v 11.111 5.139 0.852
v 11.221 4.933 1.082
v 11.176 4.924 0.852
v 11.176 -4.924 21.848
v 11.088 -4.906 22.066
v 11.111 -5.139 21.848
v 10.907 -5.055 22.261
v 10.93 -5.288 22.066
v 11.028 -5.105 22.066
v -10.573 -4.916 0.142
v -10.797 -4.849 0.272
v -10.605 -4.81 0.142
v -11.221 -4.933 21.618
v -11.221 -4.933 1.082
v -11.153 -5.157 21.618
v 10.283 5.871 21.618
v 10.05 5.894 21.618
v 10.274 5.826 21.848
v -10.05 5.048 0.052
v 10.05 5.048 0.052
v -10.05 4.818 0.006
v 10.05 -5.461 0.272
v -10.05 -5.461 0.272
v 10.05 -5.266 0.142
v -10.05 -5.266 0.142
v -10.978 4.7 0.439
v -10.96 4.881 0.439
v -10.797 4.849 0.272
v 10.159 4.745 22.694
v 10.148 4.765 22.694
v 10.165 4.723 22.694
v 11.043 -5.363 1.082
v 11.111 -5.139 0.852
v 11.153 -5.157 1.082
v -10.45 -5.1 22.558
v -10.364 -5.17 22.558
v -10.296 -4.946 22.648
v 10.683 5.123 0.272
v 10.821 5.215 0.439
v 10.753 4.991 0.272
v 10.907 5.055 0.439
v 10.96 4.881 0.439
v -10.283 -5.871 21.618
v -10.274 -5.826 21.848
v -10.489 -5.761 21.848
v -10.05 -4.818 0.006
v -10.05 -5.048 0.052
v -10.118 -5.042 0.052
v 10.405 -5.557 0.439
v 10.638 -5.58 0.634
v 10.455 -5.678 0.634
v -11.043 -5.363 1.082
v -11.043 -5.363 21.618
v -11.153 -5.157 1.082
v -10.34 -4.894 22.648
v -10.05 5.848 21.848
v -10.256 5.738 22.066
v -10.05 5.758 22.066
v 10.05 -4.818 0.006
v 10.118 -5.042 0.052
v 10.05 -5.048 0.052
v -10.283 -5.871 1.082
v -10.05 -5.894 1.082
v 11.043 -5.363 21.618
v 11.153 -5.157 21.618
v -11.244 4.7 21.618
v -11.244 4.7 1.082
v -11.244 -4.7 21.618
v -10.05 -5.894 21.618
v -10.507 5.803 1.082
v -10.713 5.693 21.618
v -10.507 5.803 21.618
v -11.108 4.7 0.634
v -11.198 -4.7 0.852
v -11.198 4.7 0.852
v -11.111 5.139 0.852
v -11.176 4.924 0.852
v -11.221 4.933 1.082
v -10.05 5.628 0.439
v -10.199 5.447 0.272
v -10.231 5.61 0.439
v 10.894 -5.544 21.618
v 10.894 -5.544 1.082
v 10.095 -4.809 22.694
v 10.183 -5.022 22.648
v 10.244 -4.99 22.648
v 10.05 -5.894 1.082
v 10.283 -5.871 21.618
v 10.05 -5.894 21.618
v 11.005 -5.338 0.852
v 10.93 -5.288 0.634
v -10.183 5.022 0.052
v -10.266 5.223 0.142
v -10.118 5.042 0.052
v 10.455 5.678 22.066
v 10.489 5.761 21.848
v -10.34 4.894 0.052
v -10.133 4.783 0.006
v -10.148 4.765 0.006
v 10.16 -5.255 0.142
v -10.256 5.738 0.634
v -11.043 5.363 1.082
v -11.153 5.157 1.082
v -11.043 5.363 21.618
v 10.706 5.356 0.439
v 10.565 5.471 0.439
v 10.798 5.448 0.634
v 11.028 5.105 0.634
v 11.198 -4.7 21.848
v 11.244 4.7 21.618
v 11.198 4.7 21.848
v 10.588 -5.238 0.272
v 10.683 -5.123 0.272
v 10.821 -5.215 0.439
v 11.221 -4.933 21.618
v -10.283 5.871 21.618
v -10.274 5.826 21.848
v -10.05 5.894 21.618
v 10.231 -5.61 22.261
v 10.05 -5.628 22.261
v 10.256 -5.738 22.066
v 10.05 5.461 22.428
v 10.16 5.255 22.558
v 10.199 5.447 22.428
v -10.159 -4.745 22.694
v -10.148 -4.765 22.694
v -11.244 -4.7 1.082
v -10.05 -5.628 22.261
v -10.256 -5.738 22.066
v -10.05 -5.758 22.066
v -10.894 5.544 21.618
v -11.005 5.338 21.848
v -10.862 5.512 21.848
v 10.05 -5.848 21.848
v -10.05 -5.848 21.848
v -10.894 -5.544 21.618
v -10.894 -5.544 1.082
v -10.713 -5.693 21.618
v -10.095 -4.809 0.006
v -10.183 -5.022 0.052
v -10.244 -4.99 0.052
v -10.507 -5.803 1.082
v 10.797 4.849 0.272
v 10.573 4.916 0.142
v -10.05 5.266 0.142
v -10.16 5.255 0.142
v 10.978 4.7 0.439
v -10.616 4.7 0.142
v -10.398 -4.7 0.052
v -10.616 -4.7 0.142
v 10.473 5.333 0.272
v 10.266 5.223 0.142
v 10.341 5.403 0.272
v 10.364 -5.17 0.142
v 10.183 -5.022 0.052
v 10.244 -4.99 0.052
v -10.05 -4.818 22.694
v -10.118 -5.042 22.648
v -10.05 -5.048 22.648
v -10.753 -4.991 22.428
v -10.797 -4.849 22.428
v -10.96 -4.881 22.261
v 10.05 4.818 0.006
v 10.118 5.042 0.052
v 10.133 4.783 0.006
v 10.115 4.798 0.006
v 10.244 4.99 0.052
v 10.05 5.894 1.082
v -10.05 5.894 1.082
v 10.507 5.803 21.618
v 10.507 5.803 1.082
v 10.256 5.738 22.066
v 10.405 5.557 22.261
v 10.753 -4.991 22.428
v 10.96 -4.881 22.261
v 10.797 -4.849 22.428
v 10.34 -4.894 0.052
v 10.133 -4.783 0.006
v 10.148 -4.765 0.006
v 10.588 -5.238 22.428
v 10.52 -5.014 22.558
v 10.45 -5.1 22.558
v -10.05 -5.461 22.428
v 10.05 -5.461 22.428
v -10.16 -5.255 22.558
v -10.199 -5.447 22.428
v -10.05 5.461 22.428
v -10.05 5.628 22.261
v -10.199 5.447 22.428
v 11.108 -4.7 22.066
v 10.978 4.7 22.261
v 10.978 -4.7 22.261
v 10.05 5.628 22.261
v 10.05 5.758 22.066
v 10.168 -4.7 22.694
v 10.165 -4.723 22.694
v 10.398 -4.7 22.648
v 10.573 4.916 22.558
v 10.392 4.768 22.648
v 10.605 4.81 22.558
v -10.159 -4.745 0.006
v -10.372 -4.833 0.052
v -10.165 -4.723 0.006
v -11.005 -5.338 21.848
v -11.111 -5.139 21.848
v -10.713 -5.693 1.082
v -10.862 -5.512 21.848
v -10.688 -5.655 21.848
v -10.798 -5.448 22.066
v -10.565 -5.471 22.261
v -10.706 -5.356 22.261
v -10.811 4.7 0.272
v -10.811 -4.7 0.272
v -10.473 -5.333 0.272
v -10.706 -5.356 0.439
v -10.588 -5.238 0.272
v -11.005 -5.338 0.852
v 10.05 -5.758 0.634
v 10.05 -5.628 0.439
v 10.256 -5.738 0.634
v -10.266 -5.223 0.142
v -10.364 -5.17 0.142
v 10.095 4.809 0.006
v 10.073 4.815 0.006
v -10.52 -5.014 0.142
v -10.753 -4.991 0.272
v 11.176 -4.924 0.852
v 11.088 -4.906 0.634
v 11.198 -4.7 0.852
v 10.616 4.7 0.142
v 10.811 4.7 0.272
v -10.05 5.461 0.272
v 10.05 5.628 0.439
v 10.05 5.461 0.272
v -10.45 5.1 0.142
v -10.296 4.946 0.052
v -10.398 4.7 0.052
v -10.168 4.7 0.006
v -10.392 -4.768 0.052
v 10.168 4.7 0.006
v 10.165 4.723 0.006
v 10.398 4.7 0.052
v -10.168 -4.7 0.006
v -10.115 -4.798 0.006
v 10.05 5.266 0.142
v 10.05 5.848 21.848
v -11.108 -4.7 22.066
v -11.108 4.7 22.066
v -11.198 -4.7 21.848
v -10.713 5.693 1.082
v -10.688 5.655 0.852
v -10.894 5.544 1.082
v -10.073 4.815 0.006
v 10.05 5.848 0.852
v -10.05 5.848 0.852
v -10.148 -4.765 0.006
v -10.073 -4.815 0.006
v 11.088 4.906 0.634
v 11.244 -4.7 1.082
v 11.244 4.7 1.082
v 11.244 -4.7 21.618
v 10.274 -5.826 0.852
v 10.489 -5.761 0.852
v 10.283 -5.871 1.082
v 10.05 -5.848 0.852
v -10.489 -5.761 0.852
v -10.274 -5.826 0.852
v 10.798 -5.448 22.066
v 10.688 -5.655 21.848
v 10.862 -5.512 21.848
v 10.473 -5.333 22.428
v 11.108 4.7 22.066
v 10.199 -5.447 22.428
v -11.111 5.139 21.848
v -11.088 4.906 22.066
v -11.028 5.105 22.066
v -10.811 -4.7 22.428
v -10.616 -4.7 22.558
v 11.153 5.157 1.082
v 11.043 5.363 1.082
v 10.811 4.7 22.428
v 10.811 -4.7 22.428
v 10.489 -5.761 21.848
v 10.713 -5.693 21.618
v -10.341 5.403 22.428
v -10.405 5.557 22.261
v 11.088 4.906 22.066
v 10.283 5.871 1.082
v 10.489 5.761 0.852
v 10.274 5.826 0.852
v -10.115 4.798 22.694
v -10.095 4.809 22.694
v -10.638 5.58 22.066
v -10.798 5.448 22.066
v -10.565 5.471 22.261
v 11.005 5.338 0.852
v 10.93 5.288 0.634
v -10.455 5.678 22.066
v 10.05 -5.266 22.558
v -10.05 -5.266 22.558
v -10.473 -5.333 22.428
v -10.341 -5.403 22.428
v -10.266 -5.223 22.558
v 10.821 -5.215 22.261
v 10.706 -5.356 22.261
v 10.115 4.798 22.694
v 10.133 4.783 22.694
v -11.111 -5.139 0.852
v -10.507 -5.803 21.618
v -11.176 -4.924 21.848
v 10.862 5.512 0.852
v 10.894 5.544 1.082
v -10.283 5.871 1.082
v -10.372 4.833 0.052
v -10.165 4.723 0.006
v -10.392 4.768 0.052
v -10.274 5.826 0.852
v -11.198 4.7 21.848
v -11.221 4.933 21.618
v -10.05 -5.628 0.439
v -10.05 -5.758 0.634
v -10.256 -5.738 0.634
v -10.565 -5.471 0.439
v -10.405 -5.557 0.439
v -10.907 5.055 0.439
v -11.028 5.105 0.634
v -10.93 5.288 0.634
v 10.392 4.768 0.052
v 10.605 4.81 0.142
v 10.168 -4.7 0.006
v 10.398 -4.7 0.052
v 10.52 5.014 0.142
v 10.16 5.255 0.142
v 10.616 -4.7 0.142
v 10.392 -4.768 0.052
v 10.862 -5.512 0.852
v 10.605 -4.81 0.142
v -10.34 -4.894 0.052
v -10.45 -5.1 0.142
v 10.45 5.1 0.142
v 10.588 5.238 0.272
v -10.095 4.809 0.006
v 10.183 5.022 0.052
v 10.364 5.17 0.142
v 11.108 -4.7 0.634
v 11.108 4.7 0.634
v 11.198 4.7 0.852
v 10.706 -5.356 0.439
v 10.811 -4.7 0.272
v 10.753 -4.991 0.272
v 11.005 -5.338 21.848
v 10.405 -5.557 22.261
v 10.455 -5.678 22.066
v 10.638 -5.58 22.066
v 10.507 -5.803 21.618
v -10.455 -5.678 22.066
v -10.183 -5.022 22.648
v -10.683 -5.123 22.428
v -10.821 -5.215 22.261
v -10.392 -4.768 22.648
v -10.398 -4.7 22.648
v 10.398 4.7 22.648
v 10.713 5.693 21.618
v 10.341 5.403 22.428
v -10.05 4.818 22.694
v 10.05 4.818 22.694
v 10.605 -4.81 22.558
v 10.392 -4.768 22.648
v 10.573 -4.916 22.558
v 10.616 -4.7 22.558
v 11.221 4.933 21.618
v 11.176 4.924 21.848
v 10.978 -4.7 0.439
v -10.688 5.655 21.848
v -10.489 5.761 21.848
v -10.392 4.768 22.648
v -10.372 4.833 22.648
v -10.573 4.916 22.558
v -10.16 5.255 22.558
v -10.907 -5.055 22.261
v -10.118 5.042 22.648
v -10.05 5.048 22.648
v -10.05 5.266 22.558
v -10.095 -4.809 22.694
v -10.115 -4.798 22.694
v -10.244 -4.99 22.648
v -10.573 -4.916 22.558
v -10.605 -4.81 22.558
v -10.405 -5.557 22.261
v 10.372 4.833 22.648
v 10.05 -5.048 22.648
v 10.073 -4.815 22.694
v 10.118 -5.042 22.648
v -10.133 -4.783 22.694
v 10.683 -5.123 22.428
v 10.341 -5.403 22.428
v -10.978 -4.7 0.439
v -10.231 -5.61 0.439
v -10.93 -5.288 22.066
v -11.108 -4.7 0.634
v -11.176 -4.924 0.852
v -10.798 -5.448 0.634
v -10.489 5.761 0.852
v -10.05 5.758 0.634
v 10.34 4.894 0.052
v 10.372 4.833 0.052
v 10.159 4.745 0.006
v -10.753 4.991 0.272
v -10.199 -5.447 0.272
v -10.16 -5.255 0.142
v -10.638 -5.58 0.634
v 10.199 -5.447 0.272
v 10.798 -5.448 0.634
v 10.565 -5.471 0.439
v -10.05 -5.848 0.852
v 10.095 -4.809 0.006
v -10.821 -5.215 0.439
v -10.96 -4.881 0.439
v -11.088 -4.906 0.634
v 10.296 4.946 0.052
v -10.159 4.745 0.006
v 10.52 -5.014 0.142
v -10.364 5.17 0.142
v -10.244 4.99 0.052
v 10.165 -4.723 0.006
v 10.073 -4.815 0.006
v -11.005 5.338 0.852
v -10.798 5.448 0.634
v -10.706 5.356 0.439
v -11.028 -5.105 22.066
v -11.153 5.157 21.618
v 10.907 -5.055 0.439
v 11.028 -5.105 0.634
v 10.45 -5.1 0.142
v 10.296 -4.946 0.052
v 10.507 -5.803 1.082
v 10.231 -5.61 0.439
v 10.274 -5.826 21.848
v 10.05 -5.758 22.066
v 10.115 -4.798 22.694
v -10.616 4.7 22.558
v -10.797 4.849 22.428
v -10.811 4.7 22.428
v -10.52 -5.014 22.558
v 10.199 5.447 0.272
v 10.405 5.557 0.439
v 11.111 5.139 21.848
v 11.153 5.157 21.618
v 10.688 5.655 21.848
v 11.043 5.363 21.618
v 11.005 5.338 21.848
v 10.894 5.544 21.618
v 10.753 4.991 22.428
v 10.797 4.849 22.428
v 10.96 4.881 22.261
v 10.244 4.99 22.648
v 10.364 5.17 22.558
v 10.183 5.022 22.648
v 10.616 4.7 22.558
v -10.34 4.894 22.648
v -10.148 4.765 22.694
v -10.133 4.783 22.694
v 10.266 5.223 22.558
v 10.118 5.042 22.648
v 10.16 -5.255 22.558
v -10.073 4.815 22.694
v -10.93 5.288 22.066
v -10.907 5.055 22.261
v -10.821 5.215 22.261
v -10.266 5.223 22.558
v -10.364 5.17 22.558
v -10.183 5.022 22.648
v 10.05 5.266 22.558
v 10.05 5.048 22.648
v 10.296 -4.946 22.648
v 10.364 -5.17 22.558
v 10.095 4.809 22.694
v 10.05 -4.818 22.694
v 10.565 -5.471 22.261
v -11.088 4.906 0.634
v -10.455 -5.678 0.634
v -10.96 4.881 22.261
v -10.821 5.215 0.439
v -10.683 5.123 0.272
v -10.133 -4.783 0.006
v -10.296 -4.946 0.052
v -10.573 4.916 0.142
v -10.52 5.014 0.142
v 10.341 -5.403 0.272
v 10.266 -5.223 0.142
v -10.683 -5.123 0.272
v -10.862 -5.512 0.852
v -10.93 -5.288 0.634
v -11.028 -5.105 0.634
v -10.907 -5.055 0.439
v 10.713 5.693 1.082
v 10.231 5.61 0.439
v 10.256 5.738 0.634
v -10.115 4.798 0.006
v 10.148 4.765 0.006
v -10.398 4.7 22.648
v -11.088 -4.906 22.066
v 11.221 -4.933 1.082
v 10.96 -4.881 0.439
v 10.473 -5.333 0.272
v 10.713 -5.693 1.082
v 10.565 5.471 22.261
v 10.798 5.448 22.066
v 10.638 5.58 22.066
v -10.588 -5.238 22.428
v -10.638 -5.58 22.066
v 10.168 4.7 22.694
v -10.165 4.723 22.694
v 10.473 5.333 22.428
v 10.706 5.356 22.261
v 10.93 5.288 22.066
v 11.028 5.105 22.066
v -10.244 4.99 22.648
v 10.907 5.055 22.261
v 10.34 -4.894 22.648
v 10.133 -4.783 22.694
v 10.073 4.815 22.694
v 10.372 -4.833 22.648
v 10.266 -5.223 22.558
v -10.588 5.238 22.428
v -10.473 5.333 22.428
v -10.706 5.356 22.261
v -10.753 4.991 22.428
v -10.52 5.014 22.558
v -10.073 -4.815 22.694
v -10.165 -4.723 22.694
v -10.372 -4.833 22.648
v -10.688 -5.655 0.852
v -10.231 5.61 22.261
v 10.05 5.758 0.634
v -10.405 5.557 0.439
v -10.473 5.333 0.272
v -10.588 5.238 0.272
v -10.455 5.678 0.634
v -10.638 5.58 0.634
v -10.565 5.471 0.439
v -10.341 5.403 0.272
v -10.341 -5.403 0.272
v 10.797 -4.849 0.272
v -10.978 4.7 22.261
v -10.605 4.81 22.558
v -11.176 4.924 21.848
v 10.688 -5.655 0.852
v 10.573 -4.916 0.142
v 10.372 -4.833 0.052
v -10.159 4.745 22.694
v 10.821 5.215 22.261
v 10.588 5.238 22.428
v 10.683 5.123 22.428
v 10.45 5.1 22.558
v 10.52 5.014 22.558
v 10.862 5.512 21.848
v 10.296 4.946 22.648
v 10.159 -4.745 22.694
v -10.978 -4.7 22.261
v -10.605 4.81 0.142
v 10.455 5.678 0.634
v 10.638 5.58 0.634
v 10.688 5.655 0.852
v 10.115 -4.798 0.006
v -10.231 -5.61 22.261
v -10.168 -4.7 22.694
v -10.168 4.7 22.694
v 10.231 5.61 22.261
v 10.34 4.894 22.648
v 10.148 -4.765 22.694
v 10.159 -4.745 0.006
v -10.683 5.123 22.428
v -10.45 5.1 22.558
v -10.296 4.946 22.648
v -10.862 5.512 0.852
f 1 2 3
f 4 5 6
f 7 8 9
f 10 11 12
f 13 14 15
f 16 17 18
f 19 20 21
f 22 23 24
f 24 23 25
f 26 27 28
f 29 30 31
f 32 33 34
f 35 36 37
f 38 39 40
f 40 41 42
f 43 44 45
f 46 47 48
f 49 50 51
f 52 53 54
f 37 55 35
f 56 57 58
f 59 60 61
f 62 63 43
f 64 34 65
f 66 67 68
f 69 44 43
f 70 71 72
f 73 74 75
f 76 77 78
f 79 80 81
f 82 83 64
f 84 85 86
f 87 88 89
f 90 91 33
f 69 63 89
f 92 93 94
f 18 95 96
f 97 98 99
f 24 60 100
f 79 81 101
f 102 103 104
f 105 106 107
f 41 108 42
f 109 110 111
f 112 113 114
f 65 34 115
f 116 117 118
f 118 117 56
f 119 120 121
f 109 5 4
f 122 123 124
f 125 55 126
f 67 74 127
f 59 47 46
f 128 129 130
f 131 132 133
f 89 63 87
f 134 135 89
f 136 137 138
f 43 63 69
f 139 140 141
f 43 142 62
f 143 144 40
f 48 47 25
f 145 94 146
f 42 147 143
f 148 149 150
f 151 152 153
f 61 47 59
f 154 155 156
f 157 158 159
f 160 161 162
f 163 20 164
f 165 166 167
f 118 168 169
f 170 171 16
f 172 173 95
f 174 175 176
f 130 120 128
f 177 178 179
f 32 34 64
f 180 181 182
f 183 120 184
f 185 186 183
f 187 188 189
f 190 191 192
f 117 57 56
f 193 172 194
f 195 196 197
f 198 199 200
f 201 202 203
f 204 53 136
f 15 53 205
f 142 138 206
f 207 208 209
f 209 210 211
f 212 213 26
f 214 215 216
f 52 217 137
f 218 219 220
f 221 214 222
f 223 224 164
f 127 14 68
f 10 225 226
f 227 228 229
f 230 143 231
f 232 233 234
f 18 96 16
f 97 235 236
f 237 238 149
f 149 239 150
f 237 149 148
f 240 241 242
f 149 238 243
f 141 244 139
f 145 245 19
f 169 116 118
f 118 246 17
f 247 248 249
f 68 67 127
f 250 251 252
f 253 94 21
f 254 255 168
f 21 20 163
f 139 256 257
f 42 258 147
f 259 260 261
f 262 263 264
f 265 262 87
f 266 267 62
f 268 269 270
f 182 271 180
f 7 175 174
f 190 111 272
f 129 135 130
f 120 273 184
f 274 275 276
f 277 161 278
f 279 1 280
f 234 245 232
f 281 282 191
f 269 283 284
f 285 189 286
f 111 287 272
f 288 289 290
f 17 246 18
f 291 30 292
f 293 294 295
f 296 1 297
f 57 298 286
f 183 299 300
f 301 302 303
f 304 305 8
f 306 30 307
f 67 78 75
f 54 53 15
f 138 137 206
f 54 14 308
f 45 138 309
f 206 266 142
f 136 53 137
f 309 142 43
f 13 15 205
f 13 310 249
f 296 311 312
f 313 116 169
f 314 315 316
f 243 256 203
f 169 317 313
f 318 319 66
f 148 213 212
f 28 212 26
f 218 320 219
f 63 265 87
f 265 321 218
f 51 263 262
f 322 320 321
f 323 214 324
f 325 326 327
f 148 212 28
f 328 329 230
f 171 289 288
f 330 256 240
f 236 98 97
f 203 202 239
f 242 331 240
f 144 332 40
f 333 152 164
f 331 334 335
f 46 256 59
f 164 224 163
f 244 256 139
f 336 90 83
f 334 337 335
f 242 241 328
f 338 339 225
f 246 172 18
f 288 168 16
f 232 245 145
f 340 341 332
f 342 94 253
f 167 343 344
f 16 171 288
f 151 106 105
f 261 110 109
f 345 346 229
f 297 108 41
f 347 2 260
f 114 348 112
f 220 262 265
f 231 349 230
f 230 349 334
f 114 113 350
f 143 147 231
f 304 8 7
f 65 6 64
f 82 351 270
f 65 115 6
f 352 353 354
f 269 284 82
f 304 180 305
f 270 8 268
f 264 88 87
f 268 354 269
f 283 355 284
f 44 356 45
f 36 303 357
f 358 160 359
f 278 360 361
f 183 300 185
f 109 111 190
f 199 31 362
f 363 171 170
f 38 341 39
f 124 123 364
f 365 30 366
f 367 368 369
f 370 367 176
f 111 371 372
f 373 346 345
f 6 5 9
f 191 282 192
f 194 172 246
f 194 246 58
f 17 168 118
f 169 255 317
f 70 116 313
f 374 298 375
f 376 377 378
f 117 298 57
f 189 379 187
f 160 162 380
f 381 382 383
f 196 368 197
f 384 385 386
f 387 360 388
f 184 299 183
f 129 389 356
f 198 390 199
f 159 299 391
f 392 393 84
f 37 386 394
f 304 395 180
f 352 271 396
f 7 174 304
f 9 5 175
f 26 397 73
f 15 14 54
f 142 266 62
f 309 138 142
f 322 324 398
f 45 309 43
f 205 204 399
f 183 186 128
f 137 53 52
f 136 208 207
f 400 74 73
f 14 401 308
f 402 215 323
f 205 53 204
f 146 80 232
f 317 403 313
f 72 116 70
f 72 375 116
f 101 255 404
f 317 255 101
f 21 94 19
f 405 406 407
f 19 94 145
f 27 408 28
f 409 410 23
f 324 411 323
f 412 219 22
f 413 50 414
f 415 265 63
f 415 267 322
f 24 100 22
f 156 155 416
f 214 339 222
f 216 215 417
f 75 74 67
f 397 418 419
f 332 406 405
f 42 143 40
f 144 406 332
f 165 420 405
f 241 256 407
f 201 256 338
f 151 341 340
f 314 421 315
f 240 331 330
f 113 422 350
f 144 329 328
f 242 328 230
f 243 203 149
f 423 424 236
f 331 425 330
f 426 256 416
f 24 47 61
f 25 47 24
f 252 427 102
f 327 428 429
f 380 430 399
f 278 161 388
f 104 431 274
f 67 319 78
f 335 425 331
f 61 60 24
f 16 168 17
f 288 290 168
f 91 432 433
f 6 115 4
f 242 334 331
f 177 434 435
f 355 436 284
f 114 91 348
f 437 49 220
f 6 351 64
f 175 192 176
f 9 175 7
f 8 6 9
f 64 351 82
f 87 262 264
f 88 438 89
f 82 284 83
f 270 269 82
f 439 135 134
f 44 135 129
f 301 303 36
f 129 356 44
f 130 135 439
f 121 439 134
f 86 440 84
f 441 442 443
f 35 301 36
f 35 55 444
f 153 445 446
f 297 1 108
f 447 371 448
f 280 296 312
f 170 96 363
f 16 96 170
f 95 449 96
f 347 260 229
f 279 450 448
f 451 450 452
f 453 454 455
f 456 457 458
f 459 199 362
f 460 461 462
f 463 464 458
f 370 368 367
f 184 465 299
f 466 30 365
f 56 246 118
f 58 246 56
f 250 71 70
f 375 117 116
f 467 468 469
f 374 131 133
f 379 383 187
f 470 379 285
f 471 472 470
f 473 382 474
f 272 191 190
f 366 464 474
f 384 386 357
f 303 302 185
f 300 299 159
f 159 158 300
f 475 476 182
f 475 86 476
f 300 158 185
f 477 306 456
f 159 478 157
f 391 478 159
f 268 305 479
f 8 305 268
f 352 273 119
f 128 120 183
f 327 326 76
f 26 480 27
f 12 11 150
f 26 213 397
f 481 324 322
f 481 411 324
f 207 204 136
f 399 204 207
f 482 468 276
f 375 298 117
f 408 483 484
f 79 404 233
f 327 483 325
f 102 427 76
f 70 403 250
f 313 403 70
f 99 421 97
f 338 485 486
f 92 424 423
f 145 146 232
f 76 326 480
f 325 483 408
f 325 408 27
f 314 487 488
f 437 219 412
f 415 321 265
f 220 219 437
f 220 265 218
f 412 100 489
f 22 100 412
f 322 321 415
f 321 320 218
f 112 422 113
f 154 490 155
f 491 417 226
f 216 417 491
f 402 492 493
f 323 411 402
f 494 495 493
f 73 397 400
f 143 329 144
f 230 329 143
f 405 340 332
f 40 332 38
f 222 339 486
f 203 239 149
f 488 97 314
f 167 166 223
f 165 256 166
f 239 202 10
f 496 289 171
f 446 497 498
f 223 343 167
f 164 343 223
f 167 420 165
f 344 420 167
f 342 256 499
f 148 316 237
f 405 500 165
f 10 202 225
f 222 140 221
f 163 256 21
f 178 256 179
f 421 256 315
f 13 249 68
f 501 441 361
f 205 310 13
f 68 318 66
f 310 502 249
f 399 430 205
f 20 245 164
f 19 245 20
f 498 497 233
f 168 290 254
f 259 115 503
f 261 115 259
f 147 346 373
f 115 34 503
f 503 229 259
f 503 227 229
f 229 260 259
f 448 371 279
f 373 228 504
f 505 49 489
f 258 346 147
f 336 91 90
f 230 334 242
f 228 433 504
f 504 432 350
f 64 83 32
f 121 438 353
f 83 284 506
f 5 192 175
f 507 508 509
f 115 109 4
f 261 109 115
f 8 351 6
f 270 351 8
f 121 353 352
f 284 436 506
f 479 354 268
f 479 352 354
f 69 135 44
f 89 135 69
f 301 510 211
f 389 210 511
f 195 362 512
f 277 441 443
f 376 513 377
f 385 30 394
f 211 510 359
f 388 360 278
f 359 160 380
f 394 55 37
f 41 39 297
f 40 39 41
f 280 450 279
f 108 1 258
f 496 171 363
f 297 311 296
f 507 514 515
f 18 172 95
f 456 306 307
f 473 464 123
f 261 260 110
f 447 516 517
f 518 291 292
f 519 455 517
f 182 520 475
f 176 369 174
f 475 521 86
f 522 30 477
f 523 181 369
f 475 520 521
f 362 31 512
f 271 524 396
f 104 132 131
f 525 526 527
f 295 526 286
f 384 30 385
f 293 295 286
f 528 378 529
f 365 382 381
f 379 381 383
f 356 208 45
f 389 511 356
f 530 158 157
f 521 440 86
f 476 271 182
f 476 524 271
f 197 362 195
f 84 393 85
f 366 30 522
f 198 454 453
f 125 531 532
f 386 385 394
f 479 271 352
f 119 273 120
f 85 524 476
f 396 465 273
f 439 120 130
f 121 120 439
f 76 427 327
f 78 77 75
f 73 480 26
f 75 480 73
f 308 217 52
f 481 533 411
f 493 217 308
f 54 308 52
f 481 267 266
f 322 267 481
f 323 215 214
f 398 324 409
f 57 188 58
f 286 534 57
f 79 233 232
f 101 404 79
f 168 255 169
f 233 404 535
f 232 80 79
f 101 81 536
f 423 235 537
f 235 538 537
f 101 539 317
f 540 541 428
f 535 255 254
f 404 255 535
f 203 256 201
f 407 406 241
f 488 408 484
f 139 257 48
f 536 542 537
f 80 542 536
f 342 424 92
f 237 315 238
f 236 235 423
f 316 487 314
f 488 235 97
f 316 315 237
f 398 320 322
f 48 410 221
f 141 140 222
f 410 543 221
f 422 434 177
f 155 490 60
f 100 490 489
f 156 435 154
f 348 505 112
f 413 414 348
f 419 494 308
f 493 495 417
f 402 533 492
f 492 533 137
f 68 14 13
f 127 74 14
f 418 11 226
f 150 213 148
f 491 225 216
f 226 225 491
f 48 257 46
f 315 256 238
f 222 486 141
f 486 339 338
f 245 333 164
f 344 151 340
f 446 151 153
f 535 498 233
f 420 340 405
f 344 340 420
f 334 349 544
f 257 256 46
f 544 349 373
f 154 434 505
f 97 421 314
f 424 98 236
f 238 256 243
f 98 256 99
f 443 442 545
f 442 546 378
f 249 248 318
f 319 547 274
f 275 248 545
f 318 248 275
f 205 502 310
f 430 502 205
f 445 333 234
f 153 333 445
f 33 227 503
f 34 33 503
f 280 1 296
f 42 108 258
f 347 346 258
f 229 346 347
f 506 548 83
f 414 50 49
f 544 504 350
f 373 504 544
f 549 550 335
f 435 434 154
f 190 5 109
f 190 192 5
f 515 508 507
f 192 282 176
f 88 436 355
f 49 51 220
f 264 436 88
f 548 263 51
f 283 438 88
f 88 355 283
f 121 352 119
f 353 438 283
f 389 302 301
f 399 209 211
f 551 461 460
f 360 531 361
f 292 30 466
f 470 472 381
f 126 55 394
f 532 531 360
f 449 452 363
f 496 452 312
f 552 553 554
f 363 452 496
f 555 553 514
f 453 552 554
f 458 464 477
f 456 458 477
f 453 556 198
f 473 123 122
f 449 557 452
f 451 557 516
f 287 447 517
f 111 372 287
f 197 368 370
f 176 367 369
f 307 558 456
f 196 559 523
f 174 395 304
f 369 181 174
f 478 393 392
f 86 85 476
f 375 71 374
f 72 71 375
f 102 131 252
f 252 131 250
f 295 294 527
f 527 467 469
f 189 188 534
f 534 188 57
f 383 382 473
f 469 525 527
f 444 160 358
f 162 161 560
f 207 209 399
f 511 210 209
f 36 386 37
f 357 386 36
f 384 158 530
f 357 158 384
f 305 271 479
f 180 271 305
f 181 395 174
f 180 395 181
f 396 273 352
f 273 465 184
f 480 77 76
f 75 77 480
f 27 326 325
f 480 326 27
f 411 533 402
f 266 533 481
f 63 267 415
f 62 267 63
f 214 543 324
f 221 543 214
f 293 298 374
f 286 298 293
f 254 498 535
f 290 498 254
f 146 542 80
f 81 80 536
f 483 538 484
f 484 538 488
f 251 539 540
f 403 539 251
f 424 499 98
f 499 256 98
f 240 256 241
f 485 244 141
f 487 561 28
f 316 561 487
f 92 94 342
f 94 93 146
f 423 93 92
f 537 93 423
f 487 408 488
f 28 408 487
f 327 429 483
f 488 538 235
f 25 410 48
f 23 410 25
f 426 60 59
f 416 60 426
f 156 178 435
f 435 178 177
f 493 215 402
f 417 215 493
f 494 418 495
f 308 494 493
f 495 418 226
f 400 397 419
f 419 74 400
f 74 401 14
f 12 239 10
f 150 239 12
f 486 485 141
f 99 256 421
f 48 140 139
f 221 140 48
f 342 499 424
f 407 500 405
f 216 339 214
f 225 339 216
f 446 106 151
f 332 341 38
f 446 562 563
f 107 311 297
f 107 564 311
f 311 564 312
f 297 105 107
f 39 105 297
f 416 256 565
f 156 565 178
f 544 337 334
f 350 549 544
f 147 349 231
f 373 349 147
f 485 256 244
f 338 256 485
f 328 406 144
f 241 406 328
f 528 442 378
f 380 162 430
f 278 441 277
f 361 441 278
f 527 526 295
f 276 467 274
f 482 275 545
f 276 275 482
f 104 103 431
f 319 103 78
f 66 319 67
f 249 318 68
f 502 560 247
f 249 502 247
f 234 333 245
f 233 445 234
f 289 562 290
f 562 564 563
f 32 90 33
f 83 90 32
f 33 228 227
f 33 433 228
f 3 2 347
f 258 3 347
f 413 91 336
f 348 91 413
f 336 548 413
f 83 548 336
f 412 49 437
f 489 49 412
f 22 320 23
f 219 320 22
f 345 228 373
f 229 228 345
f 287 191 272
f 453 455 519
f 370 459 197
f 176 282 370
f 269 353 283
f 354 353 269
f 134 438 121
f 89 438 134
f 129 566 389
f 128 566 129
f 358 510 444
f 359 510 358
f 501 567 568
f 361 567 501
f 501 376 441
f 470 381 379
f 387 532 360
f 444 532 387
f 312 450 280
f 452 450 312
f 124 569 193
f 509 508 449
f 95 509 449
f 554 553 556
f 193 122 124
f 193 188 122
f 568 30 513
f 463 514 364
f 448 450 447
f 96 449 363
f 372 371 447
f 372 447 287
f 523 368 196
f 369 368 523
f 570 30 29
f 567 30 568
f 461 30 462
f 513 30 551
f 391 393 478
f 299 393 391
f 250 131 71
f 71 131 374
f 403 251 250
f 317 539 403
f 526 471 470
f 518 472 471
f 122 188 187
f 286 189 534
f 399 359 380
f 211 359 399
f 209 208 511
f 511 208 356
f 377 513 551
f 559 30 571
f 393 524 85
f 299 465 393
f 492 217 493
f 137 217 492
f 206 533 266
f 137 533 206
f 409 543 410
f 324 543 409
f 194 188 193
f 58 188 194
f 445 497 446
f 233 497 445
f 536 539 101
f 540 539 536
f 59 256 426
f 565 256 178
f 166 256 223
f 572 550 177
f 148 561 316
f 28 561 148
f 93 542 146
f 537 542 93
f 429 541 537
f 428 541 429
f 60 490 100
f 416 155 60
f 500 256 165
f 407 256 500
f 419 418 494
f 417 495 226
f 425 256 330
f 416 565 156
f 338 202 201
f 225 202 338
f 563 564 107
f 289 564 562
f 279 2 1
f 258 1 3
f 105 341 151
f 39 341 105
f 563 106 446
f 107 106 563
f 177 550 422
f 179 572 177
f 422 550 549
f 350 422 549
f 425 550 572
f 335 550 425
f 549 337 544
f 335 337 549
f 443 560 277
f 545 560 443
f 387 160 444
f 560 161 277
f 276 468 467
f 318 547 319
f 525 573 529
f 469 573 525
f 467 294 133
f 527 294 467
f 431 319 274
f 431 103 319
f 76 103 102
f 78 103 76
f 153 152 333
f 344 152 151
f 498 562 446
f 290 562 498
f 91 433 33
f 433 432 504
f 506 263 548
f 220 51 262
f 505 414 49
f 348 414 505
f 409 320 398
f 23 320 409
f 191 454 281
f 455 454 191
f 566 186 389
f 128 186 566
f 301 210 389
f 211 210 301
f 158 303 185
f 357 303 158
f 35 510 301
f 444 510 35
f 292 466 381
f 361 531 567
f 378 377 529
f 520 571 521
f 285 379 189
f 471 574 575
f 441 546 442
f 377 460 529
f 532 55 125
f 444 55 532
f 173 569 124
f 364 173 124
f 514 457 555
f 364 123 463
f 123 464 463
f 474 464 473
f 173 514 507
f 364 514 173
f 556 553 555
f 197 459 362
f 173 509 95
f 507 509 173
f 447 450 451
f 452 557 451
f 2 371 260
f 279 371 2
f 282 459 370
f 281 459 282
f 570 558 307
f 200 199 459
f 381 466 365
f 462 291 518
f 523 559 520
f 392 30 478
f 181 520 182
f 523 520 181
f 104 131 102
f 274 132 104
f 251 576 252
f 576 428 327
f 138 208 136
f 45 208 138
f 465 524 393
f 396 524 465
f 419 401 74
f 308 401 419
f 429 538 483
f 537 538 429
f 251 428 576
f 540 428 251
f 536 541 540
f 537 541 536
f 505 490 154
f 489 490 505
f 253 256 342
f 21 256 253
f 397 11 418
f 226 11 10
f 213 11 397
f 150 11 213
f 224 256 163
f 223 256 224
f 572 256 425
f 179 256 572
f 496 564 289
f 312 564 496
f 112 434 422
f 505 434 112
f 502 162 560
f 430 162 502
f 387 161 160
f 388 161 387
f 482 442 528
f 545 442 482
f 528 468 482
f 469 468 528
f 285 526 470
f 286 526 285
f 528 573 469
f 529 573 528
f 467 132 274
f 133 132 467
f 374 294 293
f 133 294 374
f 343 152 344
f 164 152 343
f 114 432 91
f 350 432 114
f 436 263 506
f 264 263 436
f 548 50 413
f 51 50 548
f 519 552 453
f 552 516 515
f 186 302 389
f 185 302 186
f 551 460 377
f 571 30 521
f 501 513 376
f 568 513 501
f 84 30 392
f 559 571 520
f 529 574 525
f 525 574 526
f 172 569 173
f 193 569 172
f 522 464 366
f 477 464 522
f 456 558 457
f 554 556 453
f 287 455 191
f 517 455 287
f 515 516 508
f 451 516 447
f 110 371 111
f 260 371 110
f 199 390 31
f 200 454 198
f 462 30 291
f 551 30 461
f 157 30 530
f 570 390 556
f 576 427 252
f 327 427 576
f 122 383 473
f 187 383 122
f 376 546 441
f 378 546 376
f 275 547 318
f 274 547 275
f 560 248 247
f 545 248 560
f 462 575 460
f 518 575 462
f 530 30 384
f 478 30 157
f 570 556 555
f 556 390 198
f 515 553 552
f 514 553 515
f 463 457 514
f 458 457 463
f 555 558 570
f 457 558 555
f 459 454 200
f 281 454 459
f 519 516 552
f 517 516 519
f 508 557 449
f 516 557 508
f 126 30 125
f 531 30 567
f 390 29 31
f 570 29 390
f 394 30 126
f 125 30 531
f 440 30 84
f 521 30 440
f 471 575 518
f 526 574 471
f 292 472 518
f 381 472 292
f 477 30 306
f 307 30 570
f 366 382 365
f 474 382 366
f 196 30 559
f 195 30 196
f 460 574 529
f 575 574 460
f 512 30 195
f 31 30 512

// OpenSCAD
// SG90 (SG90 伺服馬達) visual source for NexCAD.
// Units: millimeters. Origin: part bottom-center, matching src/parts/library.ts.
// This generated baseline is intentionally simple; refine it with measured details before exporting STL.

$fn = 32;

module rounded_box(size, r = 0.8) {
  hull() {
    for (x = [-size[0] / 2 + r, size[0] / 2 - r])
      for (y = [-size[1] / 2 + r, size[1] / 2 - r]) {
        translate([x, y, r]) sphere(r = r);
        translate([x, y, size[2] - r]) sphere(r = r);
      }
  }
}

color("#2e7d5b") rounded_box([22.5, 11.8, 22.7], min(1.2, min(22.5, 11.8) / 8));
